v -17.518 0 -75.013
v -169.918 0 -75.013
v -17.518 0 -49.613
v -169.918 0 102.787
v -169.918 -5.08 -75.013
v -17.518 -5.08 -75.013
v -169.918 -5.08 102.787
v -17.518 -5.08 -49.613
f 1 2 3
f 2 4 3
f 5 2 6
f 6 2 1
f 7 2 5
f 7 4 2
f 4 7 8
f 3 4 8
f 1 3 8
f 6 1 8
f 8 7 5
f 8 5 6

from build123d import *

# Parameters (mm, degrees)
F0_W     = 152.4
F0_H     = 152.4
F1_DEPTH = 5.08
F3_DEPTH = 5.08
F4_DEPTH = 25.4


with BuildPart() as f1:
    # F0 (on Front) → F1 (new body)
    with BuildSketch(Plane.XZ):
        with Locations((-93.7180127949, 26.5866962026)):
            Rectangle(F0_W, F0_H)
    extrude(amount=F1_DEPTH)

    # F2 (on face) → F3 (cut)
    with BuildSketch(Plane.XZ.offset(5.08)):
        Polygon((-17.5180127949, 102.7866962026), (-169.9180127949, 102.7866962026), (-17.5180127949, -49.6133037974), align=None)
    extrude(amount=-F3_DEPTH, mode=Mode.SUBTRACT)

    # F4 (add): a face of the model
    f4_faces = [f1.faces().sort_by_distance(p)[0] for p in [
        (-93.7180127949, -2.54, -49.6133037974),
    ]]
    extrude(f4_faces, amount=F4_DEPTH)


solid = f1.part
